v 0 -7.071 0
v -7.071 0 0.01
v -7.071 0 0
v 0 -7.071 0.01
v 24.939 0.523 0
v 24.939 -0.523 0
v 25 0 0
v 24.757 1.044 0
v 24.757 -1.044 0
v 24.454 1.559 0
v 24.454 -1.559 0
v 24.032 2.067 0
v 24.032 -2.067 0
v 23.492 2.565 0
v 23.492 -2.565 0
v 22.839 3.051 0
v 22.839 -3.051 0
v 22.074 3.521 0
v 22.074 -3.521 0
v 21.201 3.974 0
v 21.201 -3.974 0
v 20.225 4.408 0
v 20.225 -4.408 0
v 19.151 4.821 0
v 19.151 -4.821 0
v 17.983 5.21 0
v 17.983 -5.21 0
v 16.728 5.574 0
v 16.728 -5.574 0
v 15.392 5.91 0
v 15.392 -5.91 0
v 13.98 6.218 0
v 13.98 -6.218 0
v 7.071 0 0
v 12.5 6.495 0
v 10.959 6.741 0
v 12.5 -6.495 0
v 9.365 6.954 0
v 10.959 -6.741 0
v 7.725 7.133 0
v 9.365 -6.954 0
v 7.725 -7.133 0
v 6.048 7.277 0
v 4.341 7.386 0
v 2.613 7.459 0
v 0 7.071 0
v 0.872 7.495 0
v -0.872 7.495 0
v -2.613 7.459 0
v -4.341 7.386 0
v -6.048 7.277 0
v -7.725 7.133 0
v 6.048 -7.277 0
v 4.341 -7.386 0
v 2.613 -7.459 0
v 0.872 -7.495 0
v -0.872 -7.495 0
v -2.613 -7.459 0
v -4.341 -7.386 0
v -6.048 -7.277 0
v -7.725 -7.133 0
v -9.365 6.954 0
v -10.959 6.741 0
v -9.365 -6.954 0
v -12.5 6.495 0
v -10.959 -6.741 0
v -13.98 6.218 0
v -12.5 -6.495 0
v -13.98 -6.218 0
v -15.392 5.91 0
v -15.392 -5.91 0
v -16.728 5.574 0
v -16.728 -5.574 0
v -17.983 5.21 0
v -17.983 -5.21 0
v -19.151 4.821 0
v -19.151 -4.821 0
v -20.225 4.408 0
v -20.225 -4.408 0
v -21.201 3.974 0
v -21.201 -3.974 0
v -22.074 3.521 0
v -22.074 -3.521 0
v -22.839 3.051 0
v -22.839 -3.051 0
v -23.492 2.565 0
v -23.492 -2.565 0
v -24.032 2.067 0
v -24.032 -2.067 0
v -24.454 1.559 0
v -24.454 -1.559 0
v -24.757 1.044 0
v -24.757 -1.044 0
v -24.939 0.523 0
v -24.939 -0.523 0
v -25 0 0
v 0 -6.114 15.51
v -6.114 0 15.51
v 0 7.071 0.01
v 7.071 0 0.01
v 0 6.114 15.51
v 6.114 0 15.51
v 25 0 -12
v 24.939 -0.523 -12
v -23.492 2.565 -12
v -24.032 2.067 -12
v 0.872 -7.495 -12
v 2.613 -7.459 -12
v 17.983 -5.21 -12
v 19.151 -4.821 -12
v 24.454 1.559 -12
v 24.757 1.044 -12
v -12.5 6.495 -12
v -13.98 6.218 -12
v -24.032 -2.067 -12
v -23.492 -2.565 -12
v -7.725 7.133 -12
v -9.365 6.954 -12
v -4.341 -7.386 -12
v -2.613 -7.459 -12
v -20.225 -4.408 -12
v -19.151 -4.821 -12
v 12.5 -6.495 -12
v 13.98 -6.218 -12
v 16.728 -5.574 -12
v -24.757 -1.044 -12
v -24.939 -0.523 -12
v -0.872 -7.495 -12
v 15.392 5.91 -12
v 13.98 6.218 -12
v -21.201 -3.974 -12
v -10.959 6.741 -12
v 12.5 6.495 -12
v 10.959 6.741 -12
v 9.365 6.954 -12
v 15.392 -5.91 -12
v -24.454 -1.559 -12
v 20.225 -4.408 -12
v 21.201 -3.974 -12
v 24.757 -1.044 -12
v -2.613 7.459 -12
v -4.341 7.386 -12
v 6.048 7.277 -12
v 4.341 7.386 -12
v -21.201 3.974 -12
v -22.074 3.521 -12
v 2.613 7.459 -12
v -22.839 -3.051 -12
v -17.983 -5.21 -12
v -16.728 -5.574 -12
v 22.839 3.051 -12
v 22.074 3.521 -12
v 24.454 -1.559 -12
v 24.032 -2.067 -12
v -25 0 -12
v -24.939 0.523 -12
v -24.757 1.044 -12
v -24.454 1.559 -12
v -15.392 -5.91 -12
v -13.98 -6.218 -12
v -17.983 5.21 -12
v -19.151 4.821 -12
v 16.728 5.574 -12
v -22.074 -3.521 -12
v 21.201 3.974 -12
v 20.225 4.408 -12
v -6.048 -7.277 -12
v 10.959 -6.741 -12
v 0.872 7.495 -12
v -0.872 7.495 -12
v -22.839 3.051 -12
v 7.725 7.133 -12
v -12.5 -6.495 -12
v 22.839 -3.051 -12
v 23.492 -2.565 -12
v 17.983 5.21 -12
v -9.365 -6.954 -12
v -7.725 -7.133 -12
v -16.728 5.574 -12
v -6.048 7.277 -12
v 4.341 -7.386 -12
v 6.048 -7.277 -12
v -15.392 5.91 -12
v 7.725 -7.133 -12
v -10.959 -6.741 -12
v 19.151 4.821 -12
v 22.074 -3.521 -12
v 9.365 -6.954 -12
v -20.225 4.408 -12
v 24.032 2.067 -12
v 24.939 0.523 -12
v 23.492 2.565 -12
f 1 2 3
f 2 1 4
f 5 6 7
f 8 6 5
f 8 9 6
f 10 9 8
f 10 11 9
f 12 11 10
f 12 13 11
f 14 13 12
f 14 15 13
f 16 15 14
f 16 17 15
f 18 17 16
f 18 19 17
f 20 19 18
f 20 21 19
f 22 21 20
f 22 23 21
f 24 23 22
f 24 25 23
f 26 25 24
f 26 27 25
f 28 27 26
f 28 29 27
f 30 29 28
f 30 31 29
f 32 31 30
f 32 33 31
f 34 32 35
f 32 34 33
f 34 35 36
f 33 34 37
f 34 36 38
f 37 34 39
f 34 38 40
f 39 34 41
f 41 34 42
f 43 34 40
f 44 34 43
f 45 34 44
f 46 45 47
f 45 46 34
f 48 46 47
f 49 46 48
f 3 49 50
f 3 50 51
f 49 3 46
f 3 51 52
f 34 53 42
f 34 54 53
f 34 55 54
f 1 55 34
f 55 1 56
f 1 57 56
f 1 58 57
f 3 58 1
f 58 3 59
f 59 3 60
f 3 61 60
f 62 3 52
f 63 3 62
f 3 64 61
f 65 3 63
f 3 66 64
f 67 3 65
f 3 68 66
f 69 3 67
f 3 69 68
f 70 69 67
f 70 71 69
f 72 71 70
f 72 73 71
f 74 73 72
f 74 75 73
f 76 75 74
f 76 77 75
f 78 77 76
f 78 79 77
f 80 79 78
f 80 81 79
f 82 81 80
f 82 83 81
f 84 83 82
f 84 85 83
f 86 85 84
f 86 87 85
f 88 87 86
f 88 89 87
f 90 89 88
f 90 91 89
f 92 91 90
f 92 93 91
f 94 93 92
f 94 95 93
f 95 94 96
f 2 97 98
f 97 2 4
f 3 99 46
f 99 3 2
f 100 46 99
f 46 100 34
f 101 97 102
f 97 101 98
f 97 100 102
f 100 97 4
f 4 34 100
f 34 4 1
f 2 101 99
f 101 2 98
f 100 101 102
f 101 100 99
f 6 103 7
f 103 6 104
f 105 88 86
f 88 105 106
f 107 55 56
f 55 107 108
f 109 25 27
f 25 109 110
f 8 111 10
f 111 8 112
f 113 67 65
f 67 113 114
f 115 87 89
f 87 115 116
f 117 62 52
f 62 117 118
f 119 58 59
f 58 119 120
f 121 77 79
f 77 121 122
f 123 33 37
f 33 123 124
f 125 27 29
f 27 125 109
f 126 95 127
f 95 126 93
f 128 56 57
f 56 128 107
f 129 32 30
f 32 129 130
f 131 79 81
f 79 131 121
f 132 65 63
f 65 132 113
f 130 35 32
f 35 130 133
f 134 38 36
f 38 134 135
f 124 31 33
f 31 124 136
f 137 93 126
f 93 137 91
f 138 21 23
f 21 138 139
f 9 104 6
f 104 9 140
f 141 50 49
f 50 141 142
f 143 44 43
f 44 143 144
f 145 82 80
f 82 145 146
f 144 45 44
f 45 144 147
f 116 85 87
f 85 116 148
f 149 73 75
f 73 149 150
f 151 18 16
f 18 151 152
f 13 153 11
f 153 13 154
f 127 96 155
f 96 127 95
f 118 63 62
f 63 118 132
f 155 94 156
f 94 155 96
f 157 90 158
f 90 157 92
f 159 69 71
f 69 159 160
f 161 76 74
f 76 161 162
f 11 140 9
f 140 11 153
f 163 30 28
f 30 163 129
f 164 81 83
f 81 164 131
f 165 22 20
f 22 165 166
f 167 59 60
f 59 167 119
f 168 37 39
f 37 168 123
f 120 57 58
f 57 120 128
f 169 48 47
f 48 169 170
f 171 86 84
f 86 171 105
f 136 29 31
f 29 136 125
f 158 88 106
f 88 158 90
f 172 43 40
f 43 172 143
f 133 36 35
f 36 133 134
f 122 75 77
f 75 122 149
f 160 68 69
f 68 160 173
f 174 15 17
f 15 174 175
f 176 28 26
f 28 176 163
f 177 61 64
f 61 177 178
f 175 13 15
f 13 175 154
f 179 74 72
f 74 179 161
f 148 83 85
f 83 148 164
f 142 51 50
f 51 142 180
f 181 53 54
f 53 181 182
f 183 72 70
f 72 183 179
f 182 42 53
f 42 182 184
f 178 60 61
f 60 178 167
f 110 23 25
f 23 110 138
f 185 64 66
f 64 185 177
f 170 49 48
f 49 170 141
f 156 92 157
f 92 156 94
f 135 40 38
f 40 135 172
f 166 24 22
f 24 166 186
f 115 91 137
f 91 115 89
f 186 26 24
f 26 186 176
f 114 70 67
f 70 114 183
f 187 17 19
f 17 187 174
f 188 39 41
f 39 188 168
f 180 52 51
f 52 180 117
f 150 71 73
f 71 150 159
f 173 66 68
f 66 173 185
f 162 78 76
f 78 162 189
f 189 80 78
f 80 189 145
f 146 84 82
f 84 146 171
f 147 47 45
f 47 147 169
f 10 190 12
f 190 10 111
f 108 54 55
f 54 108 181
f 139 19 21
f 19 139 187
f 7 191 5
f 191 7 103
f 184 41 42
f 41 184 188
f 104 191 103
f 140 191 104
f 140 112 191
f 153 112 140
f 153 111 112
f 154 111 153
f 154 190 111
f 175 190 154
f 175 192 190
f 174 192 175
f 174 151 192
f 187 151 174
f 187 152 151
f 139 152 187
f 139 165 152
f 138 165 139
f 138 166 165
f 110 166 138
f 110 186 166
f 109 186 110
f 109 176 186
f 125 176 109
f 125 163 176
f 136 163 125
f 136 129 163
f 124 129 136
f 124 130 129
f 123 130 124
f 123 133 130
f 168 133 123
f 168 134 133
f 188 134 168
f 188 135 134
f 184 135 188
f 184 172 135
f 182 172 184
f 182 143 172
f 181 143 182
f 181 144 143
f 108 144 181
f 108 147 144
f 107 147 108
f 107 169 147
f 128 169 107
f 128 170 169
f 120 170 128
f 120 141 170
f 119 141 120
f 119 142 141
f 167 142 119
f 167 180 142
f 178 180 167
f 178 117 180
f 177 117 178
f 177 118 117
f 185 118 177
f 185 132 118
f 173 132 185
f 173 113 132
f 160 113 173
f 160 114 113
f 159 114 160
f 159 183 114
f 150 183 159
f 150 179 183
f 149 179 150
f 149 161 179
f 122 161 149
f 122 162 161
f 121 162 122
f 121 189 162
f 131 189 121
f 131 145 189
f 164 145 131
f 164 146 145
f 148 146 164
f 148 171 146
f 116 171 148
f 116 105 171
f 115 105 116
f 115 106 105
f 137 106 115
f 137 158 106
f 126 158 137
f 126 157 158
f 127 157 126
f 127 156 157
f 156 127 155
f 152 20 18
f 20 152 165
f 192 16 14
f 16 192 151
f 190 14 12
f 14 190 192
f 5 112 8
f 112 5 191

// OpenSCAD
// Arbor accessory for a wider top

PEG_HEIGHT = 15.5;
PEG_SIDE = 10;
PEG_DRAFT = 2.5;
OVAL_X = 50;
OVAL_Y = PEG_SIDE * 1.5;
THICKNESS = 12;

PEG_SIDE_TOP = PEG_SIDE - 2 * PEG_HEIGHT * tan(PEG_DRAFT);
t = 0.01;
$fn = 90;

// PEG
rotate([0,0,45]) hull() {
    translate([-PEG_SIDE/2, -PEG_SIDE/2, 0]) cube([PEG_SIDE, PEG_SIDE, t]);
    translate([-PEG_SIDE_TOP/2, -PEG_SIDE_TOP/2, PEG_HEIGHT]) cube([PEG_SIDE_TOP, PEG_SIDE_TOP, t]);
}

translate([0,0,-THICKNESS]) linear_extrude(THICKNESS) scale([1,OVAL_Y/OVAL_X]) circle(d=OVAL_X);
